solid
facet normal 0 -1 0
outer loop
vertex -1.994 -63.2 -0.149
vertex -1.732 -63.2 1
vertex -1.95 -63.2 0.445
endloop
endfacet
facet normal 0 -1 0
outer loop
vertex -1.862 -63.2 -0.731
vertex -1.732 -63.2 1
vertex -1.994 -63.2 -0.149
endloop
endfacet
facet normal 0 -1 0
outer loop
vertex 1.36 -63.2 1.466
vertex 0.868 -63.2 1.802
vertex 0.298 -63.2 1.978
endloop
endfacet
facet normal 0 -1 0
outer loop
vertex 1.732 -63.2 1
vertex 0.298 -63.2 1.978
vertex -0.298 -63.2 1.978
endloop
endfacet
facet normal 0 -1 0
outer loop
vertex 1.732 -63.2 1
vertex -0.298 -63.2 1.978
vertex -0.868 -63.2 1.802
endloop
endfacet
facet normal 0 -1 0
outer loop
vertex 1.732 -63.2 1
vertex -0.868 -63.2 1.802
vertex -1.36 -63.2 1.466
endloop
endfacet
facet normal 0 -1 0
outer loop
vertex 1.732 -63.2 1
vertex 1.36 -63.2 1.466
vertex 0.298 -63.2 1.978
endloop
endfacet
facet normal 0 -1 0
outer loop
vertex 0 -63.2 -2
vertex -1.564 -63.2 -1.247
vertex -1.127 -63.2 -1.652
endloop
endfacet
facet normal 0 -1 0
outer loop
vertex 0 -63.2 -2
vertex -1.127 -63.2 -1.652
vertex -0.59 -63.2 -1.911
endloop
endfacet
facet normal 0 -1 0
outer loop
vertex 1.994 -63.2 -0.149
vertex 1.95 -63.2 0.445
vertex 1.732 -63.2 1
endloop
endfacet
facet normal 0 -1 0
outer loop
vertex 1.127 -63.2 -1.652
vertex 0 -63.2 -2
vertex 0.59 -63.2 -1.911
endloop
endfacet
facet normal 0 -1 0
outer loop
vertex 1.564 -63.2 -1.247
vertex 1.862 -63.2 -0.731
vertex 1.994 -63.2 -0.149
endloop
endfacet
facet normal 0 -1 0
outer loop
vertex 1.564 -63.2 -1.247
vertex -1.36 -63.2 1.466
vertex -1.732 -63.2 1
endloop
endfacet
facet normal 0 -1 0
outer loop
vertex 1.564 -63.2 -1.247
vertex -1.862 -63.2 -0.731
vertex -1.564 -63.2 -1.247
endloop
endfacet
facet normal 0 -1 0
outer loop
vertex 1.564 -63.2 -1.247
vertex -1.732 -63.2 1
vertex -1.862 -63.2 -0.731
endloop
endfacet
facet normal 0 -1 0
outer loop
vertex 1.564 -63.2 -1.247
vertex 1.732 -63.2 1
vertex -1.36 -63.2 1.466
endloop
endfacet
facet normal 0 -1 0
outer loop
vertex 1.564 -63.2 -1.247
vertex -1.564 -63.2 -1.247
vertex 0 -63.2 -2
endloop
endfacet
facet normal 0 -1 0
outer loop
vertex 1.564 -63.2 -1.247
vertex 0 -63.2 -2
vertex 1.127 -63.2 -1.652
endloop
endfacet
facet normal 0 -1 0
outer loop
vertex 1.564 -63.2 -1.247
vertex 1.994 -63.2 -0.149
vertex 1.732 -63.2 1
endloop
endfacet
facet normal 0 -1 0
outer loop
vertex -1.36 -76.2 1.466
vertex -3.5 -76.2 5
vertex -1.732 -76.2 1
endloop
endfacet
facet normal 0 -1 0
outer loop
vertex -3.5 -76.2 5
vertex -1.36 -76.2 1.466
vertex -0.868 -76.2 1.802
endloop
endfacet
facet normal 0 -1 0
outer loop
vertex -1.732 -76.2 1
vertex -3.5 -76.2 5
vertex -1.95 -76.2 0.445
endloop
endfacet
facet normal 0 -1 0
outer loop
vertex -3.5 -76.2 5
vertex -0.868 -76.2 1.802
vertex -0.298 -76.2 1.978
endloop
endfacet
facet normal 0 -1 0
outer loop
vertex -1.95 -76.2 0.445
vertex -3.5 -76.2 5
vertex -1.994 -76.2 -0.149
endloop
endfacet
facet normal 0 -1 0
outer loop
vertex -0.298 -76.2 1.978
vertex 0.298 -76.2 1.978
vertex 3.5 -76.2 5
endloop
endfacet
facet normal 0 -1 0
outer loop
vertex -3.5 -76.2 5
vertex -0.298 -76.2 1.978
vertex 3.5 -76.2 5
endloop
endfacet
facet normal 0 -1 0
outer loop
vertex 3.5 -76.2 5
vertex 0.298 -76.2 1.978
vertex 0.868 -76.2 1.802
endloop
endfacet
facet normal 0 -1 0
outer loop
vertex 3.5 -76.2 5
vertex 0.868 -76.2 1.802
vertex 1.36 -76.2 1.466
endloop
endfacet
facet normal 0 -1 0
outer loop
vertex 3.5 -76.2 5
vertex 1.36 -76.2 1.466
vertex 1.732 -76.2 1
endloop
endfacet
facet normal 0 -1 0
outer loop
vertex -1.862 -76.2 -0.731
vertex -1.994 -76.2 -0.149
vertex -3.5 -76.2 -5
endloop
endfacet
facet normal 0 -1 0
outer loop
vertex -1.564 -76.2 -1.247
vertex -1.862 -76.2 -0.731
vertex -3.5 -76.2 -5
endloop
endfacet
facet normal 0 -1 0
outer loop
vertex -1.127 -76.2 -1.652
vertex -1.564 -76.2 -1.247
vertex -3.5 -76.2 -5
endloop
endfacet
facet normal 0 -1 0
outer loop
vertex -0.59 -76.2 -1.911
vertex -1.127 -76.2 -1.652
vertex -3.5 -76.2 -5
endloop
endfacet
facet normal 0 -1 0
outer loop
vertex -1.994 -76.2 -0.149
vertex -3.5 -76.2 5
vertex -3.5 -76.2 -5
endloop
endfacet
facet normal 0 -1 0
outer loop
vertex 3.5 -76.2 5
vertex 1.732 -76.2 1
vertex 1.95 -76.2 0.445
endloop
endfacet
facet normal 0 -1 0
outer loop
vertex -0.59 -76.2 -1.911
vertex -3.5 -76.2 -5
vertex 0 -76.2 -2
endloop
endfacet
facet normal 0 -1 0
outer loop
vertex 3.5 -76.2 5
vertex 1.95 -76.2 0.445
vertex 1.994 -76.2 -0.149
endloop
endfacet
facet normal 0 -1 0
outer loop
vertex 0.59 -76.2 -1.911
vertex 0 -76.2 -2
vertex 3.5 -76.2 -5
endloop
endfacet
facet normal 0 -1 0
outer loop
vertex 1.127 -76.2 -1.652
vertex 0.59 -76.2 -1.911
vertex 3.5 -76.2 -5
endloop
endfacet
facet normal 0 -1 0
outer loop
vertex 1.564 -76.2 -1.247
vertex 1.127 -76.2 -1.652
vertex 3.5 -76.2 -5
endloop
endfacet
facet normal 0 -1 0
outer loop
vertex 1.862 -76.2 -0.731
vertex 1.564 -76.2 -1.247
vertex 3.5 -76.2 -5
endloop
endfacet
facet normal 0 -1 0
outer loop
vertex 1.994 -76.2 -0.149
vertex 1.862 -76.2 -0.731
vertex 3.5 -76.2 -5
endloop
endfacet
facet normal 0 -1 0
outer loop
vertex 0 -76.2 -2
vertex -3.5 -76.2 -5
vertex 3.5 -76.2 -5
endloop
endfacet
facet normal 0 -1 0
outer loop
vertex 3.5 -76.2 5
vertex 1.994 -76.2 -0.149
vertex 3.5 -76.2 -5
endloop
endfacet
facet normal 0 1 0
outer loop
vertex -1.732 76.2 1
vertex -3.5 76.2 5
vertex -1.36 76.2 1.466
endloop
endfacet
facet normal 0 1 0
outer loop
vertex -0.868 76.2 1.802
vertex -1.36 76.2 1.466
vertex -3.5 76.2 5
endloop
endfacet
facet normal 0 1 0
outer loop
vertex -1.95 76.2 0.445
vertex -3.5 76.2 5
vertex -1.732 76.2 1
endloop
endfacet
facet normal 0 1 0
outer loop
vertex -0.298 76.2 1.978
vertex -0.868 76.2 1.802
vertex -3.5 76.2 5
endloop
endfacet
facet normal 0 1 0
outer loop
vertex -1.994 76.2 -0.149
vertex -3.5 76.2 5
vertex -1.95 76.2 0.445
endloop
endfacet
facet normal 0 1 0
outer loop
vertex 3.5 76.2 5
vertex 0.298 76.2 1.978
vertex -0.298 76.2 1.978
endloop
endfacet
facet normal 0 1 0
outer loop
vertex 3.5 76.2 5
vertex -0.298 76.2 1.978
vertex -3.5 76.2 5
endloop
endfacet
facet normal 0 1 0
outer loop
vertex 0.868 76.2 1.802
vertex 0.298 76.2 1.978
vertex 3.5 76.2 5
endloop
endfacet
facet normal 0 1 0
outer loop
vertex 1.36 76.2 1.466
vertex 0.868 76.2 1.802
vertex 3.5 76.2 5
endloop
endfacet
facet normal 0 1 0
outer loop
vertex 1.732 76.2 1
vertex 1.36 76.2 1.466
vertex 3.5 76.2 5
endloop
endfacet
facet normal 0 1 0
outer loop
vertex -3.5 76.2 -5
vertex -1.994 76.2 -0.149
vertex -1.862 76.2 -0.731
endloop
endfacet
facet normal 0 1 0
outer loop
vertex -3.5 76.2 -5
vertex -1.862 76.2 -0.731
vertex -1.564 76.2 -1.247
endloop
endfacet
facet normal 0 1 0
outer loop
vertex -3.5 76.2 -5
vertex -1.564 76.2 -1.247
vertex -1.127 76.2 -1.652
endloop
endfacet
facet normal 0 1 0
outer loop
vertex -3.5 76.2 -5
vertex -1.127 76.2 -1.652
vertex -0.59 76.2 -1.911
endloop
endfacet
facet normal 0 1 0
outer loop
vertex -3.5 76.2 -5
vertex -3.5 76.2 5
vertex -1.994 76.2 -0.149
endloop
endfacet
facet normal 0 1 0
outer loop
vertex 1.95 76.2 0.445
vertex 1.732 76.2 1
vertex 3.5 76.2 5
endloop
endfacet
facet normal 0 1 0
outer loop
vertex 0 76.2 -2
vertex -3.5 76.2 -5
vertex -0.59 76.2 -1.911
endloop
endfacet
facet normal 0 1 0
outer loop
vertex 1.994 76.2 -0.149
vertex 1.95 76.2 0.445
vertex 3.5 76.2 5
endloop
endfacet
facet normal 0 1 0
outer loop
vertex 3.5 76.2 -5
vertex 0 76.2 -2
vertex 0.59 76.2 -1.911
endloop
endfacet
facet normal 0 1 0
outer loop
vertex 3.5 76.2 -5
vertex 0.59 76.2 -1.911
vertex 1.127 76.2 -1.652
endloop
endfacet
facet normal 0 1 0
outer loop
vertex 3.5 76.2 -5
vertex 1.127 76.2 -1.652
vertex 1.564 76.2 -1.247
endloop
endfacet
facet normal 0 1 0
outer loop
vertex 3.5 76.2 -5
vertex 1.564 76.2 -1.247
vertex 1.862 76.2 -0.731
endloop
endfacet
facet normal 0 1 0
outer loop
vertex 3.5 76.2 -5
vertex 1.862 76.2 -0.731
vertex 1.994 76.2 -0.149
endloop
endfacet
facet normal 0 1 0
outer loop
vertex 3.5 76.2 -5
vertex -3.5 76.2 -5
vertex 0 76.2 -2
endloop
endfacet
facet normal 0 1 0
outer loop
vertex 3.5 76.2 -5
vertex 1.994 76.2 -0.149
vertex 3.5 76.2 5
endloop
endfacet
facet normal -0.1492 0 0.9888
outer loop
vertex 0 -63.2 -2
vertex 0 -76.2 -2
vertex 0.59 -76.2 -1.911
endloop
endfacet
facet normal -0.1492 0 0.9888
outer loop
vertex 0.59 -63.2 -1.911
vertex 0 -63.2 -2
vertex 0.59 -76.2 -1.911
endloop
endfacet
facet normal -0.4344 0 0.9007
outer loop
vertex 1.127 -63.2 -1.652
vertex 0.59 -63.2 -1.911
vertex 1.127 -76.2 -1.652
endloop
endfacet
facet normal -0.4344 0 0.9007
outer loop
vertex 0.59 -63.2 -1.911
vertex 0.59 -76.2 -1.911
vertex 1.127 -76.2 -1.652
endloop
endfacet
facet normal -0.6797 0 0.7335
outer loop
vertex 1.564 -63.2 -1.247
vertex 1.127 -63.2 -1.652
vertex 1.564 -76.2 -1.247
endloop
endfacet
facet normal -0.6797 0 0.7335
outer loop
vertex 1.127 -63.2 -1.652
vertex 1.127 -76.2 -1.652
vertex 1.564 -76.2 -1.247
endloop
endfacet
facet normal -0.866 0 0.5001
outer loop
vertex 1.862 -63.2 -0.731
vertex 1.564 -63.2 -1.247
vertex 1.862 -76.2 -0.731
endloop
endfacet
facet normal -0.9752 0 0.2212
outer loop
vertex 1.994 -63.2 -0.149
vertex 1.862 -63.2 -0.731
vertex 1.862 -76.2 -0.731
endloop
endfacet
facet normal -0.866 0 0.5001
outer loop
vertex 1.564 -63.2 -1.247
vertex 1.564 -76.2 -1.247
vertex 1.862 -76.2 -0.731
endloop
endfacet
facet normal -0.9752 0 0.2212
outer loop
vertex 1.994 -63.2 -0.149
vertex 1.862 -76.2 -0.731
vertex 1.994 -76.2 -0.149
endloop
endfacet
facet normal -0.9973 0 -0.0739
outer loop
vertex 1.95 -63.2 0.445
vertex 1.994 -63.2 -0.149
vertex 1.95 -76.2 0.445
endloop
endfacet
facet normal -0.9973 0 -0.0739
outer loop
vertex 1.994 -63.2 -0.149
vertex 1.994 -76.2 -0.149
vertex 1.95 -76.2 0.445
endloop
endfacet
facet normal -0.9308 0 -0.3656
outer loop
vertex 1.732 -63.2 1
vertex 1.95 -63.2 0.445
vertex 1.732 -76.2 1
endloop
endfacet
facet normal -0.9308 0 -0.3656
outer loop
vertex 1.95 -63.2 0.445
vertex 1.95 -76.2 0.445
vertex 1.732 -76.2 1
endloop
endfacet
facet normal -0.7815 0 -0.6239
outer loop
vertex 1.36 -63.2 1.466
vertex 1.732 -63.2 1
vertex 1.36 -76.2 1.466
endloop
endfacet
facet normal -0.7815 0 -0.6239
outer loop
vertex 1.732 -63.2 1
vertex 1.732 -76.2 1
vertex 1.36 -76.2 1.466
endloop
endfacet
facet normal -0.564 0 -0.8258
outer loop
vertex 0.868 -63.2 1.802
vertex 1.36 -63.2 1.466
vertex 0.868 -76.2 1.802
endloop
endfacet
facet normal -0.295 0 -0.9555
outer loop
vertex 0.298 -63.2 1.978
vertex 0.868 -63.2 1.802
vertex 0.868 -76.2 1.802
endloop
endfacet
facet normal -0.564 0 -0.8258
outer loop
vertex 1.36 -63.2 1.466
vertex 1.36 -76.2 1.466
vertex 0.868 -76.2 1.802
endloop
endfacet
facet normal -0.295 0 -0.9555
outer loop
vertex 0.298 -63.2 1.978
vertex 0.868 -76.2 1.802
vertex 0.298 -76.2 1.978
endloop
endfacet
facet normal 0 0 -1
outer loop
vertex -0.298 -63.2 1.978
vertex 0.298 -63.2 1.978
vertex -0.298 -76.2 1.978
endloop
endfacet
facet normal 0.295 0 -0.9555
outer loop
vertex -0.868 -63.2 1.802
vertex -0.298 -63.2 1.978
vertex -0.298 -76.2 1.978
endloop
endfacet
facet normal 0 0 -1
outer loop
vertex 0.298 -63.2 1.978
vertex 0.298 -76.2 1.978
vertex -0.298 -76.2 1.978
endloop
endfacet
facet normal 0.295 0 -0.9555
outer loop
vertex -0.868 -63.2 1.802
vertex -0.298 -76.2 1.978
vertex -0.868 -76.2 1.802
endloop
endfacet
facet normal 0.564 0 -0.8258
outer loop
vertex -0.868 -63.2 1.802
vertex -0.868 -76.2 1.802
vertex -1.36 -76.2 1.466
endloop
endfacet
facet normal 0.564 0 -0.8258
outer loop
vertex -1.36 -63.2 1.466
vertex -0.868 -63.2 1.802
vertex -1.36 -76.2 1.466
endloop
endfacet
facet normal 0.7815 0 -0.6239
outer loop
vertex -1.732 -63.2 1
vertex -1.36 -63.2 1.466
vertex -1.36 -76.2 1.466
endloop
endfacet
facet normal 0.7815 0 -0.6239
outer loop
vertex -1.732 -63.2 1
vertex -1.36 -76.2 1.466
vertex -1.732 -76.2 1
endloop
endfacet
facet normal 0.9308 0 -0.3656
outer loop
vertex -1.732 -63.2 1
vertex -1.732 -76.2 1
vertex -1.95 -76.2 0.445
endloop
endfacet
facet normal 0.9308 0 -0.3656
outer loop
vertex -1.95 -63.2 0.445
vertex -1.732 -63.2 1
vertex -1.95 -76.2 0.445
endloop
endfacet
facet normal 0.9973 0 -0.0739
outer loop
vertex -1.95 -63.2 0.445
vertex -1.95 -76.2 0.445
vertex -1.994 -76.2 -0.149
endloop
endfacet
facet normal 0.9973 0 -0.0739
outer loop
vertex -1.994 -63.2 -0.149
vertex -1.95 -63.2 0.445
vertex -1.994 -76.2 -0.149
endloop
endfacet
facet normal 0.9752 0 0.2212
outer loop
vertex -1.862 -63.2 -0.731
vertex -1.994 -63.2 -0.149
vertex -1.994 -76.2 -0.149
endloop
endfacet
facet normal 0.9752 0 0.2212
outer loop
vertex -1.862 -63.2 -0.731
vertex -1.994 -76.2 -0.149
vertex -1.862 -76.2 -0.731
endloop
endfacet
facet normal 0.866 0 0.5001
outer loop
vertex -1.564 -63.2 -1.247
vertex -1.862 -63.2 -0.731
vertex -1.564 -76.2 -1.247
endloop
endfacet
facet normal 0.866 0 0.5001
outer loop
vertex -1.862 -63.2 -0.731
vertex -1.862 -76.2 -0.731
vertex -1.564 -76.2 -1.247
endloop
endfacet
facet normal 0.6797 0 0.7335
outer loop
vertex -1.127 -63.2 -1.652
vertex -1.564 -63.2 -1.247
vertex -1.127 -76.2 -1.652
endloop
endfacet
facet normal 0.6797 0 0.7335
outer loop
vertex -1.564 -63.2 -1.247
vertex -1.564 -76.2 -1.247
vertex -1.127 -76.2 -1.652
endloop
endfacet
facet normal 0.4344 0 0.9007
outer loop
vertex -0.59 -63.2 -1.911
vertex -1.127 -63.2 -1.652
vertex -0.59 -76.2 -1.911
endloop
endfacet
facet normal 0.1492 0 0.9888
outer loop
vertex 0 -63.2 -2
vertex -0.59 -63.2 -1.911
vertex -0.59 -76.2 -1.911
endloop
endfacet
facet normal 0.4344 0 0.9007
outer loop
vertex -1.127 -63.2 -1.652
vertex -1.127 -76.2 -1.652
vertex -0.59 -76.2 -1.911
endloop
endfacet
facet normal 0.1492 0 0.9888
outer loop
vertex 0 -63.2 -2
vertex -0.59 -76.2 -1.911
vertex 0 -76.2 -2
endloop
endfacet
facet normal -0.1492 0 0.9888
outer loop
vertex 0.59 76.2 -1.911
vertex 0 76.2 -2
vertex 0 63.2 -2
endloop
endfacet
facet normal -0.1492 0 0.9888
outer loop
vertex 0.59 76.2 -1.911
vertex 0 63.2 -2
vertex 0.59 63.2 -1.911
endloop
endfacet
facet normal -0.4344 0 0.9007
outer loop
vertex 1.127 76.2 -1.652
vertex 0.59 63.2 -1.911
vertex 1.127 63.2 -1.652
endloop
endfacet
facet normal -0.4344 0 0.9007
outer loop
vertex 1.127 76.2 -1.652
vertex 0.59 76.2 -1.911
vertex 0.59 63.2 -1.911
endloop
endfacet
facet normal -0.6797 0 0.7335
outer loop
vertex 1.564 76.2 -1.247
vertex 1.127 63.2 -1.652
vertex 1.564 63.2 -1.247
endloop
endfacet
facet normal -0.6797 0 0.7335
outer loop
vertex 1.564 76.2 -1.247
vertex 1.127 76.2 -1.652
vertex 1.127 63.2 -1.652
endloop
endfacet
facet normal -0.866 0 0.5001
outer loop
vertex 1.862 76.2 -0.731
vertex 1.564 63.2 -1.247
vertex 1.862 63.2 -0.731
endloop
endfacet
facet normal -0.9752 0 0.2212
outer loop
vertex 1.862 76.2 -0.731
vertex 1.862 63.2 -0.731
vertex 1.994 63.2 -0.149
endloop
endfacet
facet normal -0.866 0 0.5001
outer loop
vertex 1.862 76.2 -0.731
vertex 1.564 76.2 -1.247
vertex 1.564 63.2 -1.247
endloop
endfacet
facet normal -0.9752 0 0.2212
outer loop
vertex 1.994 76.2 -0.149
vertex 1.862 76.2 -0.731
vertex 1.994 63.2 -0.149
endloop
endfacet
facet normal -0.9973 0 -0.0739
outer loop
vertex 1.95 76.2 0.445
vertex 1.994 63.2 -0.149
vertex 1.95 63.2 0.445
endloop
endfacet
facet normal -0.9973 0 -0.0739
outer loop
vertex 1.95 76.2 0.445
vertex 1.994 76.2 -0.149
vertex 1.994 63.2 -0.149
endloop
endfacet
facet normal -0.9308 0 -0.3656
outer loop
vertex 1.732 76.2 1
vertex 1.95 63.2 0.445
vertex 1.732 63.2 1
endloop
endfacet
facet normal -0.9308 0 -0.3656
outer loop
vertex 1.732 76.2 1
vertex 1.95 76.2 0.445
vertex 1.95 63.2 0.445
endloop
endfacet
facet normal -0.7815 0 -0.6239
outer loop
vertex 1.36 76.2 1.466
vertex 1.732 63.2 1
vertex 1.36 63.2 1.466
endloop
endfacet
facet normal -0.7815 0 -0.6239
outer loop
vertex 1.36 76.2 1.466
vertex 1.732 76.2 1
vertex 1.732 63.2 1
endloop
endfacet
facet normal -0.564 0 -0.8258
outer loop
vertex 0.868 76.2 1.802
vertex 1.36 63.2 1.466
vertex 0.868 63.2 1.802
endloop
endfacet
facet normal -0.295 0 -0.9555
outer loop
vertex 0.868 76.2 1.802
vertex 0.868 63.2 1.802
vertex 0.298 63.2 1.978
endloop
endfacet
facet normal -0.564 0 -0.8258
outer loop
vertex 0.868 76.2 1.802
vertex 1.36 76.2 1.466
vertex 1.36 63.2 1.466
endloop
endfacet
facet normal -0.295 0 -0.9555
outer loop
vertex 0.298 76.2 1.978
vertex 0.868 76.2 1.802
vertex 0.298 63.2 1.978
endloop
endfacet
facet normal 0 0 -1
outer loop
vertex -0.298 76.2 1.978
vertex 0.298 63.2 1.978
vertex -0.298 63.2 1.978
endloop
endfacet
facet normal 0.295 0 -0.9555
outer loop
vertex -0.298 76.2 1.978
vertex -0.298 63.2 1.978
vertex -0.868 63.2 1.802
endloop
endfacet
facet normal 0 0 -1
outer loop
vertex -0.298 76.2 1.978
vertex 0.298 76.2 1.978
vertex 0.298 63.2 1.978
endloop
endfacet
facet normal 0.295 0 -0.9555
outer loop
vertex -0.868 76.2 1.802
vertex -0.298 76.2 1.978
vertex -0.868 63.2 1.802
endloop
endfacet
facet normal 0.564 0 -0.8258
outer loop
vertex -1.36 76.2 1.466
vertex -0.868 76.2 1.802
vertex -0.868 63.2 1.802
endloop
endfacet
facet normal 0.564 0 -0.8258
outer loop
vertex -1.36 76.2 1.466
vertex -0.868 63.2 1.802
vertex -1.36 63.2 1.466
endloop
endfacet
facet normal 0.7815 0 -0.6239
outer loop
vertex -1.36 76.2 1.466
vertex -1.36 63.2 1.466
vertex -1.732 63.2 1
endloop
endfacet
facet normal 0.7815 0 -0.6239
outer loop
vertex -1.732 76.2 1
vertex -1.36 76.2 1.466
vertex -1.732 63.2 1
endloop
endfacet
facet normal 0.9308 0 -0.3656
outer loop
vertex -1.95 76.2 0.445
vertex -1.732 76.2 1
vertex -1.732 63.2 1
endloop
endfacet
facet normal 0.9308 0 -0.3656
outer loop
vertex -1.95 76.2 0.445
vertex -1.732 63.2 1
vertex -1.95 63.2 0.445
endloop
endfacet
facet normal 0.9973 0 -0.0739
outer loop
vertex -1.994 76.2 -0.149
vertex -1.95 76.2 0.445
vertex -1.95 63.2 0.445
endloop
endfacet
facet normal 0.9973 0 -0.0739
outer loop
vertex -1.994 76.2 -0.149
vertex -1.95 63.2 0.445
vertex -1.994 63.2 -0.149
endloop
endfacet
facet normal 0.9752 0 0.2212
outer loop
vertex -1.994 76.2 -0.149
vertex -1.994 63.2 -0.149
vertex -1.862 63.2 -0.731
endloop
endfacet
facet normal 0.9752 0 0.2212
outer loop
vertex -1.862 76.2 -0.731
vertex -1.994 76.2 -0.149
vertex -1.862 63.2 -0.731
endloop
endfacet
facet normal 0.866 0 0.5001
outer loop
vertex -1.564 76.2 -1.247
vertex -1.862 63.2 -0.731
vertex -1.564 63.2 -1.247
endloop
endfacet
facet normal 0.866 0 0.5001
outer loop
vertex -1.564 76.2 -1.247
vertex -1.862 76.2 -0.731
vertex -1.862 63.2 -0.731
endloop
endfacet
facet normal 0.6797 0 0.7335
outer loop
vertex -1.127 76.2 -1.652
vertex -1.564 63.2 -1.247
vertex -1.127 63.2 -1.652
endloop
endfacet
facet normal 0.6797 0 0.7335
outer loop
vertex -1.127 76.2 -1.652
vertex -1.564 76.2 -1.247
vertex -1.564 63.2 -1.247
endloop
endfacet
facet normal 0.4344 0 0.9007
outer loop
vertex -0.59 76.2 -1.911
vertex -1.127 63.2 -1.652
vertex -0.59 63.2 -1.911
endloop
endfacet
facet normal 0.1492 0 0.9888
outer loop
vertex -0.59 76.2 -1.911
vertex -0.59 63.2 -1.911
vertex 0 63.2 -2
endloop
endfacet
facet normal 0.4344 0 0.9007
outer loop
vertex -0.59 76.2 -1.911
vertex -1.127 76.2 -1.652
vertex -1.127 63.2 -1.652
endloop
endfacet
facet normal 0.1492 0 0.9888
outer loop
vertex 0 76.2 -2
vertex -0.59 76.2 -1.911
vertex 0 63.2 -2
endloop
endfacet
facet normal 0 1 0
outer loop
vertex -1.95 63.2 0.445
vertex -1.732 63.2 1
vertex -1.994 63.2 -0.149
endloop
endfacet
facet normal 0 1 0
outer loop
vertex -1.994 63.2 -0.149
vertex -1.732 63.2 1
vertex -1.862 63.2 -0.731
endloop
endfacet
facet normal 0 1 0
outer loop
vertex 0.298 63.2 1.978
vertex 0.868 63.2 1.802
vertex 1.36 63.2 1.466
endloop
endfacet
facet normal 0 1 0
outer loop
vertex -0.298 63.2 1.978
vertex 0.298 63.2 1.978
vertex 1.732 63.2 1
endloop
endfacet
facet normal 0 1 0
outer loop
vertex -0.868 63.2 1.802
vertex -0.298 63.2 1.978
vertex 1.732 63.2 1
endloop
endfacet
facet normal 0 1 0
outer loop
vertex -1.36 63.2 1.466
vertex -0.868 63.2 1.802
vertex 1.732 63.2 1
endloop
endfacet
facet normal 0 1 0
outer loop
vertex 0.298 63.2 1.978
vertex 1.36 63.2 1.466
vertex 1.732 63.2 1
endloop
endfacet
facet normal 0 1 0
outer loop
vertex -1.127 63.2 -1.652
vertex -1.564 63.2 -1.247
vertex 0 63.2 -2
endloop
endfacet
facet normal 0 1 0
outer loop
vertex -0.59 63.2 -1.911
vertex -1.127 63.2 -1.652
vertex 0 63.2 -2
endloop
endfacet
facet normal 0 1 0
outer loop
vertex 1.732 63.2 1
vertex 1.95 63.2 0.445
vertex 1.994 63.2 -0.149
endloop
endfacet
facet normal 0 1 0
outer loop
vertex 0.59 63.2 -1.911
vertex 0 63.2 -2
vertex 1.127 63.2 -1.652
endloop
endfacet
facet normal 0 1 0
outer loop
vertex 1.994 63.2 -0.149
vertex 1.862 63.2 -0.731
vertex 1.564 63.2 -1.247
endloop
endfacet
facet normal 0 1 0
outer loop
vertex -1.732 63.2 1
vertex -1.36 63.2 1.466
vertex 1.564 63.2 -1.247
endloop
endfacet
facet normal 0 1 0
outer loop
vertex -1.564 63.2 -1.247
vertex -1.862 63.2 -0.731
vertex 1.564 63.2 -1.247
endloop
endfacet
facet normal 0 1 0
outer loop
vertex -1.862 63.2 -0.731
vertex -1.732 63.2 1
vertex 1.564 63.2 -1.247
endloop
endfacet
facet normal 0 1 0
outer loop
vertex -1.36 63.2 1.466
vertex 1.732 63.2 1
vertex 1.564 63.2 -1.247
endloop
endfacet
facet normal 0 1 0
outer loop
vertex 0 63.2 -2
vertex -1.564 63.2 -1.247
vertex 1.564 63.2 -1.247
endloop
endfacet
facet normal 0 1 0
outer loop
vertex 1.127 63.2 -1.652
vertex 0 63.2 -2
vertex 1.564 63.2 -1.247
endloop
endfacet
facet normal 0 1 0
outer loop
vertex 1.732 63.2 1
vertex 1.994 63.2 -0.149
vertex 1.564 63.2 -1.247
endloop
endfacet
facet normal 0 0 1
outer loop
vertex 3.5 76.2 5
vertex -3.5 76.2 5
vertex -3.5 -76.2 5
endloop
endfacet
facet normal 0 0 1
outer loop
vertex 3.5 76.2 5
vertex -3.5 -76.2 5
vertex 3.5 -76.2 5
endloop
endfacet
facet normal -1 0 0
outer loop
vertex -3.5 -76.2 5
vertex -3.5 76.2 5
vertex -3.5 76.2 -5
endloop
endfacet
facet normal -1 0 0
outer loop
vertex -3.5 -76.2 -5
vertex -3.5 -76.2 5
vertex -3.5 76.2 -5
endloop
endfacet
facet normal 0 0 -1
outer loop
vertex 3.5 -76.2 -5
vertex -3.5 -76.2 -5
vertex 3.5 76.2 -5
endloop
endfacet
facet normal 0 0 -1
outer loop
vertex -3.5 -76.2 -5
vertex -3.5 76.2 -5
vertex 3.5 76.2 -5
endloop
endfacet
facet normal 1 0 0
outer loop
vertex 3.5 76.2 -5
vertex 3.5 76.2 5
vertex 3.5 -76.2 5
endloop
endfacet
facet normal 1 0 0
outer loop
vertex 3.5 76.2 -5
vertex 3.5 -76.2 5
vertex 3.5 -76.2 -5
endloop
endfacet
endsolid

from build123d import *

# Parameters (mm, degrees)
SKETCH1_W           = 7
SKETCH1_H           = 10
BOSS_EXTRUDE1_DEPTH = 76.2
SKETCH6_R           = 2
CUT_EXTRUDE3_DEPTH  = 13


with BuildPart() as part:
    # Sketch1 → Boss-Extrude1 (new, symmetric)
    with BuildSketch(Plane(origin=(0, 0, 0), x_dir=(1, 0, 0), z_dir=(0, 1, 0))):
        Rectangle(SKETCH1_W, SKETCH1_H)
    extrude(amount=BOSS_EXTRUDE1_DEPTH, both=True)

    # Sketch6 → Cut-Extrude3 (cut)
    with BuildSketch(Plane.XZ.offset(76.2)):
        with Locations(Location((0, 0, 0), (0, 0, 270))):
            Circle(SKETCH6_R)
    cut_extrude3 = extrude(amount=-CUT_EXTRUDE3_DEPTH, mode=Mode.SUBTRACT)

    # Mirror1: Cut-Extrude3 across plane
    add(cut_extrude3.mirror(Plane.ZX), mode=Mode.SUBTRACT)


solid = part.part
